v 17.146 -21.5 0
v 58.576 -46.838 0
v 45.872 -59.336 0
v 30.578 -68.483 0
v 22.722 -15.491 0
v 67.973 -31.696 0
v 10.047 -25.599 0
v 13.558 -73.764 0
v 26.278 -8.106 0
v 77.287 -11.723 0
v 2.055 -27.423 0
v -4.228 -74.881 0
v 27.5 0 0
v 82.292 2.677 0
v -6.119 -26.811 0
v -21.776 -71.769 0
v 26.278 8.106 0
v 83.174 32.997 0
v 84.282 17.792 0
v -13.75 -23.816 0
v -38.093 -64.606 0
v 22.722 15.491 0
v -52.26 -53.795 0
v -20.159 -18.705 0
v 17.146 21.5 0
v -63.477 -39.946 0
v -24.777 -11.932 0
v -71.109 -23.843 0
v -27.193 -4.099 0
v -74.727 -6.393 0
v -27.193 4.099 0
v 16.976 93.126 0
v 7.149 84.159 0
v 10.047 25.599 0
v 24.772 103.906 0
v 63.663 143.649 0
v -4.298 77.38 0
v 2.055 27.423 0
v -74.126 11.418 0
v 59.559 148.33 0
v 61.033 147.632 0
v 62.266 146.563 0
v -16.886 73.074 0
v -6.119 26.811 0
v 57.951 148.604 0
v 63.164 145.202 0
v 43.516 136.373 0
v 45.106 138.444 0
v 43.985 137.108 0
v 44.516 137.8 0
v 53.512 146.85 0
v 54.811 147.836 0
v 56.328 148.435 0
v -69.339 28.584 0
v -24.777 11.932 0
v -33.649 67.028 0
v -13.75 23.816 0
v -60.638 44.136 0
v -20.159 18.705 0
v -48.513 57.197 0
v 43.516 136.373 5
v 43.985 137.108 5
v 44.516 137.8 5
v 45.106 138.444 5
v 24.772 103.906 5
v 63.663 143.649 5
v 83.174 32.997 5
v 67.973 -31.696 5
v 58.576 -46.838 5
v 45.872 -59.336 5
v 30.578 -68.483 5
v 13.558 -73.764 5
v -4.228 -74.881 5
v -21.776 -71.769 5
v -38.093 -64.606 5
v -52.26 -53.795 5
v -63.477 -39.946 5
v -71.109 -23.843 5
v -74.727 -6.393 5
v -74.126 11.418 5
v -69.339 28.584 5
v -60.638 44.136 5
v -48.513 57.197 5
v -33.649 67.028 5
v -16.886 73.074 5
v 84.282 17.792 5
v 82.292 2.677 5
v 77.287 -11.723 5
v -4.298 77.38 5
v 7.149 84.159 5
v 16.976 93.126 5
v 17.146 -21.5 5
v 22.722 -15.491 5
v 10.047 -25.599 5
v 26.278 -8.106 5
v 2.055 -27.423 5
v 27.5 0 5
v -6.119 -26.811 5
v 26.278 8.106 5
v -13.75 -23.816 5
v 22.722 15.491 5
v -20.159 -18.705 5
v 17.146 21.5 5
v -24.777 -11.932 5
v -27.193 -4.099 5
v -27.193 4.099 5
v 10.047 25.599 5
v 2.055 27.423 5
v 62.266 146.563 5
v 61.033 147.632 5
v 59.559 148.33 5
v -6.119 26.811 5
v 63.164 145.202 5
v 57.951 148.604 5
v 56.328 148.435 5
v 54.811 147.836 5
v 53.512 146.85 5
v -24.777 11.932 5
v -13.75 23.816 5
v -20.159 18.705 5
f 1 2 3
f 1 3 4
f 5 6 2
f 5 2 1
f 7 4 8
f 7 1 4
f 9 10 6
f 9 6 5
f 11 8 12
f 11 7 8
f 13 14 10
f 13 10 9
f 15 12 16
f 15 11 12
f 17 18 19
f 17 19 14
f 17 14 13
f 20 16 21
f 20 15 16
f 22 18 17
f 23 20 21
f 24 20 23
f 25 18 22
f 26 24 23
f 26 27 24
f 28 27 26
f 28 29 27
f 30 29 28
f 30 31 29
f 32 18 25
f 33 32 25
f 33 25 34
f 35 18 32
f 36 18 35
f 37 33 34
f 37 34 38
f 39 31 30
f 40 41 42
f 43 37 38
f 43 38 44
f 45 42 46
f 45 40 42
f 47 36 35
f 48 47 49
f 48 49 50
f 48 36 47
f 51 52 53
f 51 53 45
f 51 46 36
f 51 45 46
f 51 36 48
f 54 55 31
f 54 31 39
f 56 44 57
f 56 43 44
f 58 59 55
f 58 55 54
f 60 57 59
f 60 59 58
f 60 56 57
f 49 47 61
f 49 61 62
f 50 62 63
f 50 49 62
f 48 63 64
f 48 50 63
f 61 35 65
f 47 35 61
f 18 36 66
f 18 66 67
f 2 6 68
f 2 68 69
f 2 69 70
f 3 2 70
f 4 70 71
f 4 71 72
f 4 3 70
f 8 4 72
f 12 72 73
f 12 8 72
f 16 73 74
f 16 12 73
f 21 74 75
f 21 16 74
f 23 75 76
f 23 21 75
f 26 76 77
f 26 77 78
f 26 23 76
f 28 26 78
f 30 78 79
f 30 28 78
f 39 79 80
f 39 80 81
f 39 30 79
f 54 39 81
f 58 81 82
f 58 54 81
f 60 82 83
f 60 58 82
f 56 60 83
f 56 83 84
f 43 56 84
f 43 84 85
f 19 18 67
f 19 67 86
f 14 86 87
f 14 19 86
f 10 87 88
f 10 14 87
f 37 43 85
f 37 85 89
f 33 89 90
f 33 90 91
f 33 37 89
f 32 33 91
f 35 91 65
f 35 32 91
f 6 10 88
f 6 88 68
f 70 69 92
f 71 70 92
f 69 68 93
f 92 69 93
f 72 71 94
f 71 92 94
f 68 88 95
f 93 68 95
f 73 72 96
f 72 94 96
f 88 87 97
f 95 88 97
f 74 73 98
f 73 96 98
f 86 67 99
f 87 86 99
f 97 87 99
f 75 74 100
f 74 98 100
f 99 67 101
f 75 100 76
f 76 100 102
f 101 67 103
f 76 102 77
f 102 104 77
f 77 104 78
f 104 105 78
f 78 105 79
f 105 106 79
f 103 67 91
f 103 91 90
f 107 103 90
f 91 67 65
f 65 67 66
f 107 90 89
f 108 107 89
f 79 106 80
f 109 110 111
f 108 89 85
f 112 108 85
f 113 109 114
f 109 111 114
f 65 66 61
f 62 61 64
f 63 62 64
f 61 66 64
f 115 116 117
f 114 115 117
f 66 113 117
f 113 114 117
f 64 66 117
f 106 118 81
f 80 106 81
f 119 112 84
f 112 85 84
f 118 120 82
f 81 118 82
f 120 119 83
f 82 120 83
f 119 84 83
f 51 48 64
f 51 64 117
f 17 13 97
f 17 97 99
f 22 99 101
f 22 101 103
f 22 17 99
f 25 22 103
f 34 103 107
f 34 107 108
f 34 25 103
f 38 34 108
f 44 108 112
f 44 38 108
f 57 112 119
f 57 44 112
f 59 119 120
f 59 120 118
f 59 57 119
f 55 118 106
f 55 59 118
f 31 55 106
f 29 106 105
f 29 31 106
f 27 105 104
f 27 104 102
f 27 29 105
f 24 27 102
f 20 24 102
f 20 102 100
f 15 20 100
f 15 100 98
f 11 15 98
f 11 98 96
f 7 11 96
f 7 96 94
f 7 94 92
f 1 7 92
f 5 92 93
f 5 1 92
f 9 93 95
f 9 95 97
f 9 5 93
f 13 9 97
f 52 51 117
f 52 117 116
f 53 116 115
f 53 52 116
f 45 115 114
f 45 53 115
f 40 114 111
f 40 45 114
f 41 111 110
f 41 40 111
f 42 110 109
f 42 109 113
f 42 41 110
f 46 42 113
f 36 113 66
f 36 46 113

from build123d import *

# Parameters (mm, degrees)
SKETCH1_R      = 27.5
EXTRUDE1_DEPTH = 5


with BuildPart() as part:
    # Sketch1 → Extrude1 (new body)
    with BuildSketch(Plane.XY):
        with BuildLine():
            Line((24.77155023, 103.905583581), (43.516396951, 136.372610482))
            ThreePointArc((43.516396951, 136.372610482), (44.243117586, 137.460224772), (45.105583177, 138.443678294))
            Line((45.105583177, 138.443678294), (53.511867952, 146.849963069))
            ThreePointArc((53.511867952, 146.849963069), (59.558743436, 148.329624086), (63.663355157, 143.649211448))
            Line((63.663355157, 143.649211448), (83.174325272, 32.997001352))
            ThreePointArc((83.174325272, 32.997001352), (83.672108399, 10.183923611), (77.286827824, -11.722981603))
            Line((77.286827824, -11.722981603), (67.973084028, -31.696369631))
            ThreePointArc((67.973084028, -31.696369631), (-58.281283725, -47.204787547), (-16.885768401, 73.074419775))
            ThreePointArc((-16.885768401, 73.074419775), (7.148542121, 84.158707713), (24.77155023, 103.905583581))
        make_face()
        Circle(SKETCH1_R, mode=Mode.SUBTRACT)
    extrude(amount=EXTRUDE1_DEPTH)


solid = part.part
